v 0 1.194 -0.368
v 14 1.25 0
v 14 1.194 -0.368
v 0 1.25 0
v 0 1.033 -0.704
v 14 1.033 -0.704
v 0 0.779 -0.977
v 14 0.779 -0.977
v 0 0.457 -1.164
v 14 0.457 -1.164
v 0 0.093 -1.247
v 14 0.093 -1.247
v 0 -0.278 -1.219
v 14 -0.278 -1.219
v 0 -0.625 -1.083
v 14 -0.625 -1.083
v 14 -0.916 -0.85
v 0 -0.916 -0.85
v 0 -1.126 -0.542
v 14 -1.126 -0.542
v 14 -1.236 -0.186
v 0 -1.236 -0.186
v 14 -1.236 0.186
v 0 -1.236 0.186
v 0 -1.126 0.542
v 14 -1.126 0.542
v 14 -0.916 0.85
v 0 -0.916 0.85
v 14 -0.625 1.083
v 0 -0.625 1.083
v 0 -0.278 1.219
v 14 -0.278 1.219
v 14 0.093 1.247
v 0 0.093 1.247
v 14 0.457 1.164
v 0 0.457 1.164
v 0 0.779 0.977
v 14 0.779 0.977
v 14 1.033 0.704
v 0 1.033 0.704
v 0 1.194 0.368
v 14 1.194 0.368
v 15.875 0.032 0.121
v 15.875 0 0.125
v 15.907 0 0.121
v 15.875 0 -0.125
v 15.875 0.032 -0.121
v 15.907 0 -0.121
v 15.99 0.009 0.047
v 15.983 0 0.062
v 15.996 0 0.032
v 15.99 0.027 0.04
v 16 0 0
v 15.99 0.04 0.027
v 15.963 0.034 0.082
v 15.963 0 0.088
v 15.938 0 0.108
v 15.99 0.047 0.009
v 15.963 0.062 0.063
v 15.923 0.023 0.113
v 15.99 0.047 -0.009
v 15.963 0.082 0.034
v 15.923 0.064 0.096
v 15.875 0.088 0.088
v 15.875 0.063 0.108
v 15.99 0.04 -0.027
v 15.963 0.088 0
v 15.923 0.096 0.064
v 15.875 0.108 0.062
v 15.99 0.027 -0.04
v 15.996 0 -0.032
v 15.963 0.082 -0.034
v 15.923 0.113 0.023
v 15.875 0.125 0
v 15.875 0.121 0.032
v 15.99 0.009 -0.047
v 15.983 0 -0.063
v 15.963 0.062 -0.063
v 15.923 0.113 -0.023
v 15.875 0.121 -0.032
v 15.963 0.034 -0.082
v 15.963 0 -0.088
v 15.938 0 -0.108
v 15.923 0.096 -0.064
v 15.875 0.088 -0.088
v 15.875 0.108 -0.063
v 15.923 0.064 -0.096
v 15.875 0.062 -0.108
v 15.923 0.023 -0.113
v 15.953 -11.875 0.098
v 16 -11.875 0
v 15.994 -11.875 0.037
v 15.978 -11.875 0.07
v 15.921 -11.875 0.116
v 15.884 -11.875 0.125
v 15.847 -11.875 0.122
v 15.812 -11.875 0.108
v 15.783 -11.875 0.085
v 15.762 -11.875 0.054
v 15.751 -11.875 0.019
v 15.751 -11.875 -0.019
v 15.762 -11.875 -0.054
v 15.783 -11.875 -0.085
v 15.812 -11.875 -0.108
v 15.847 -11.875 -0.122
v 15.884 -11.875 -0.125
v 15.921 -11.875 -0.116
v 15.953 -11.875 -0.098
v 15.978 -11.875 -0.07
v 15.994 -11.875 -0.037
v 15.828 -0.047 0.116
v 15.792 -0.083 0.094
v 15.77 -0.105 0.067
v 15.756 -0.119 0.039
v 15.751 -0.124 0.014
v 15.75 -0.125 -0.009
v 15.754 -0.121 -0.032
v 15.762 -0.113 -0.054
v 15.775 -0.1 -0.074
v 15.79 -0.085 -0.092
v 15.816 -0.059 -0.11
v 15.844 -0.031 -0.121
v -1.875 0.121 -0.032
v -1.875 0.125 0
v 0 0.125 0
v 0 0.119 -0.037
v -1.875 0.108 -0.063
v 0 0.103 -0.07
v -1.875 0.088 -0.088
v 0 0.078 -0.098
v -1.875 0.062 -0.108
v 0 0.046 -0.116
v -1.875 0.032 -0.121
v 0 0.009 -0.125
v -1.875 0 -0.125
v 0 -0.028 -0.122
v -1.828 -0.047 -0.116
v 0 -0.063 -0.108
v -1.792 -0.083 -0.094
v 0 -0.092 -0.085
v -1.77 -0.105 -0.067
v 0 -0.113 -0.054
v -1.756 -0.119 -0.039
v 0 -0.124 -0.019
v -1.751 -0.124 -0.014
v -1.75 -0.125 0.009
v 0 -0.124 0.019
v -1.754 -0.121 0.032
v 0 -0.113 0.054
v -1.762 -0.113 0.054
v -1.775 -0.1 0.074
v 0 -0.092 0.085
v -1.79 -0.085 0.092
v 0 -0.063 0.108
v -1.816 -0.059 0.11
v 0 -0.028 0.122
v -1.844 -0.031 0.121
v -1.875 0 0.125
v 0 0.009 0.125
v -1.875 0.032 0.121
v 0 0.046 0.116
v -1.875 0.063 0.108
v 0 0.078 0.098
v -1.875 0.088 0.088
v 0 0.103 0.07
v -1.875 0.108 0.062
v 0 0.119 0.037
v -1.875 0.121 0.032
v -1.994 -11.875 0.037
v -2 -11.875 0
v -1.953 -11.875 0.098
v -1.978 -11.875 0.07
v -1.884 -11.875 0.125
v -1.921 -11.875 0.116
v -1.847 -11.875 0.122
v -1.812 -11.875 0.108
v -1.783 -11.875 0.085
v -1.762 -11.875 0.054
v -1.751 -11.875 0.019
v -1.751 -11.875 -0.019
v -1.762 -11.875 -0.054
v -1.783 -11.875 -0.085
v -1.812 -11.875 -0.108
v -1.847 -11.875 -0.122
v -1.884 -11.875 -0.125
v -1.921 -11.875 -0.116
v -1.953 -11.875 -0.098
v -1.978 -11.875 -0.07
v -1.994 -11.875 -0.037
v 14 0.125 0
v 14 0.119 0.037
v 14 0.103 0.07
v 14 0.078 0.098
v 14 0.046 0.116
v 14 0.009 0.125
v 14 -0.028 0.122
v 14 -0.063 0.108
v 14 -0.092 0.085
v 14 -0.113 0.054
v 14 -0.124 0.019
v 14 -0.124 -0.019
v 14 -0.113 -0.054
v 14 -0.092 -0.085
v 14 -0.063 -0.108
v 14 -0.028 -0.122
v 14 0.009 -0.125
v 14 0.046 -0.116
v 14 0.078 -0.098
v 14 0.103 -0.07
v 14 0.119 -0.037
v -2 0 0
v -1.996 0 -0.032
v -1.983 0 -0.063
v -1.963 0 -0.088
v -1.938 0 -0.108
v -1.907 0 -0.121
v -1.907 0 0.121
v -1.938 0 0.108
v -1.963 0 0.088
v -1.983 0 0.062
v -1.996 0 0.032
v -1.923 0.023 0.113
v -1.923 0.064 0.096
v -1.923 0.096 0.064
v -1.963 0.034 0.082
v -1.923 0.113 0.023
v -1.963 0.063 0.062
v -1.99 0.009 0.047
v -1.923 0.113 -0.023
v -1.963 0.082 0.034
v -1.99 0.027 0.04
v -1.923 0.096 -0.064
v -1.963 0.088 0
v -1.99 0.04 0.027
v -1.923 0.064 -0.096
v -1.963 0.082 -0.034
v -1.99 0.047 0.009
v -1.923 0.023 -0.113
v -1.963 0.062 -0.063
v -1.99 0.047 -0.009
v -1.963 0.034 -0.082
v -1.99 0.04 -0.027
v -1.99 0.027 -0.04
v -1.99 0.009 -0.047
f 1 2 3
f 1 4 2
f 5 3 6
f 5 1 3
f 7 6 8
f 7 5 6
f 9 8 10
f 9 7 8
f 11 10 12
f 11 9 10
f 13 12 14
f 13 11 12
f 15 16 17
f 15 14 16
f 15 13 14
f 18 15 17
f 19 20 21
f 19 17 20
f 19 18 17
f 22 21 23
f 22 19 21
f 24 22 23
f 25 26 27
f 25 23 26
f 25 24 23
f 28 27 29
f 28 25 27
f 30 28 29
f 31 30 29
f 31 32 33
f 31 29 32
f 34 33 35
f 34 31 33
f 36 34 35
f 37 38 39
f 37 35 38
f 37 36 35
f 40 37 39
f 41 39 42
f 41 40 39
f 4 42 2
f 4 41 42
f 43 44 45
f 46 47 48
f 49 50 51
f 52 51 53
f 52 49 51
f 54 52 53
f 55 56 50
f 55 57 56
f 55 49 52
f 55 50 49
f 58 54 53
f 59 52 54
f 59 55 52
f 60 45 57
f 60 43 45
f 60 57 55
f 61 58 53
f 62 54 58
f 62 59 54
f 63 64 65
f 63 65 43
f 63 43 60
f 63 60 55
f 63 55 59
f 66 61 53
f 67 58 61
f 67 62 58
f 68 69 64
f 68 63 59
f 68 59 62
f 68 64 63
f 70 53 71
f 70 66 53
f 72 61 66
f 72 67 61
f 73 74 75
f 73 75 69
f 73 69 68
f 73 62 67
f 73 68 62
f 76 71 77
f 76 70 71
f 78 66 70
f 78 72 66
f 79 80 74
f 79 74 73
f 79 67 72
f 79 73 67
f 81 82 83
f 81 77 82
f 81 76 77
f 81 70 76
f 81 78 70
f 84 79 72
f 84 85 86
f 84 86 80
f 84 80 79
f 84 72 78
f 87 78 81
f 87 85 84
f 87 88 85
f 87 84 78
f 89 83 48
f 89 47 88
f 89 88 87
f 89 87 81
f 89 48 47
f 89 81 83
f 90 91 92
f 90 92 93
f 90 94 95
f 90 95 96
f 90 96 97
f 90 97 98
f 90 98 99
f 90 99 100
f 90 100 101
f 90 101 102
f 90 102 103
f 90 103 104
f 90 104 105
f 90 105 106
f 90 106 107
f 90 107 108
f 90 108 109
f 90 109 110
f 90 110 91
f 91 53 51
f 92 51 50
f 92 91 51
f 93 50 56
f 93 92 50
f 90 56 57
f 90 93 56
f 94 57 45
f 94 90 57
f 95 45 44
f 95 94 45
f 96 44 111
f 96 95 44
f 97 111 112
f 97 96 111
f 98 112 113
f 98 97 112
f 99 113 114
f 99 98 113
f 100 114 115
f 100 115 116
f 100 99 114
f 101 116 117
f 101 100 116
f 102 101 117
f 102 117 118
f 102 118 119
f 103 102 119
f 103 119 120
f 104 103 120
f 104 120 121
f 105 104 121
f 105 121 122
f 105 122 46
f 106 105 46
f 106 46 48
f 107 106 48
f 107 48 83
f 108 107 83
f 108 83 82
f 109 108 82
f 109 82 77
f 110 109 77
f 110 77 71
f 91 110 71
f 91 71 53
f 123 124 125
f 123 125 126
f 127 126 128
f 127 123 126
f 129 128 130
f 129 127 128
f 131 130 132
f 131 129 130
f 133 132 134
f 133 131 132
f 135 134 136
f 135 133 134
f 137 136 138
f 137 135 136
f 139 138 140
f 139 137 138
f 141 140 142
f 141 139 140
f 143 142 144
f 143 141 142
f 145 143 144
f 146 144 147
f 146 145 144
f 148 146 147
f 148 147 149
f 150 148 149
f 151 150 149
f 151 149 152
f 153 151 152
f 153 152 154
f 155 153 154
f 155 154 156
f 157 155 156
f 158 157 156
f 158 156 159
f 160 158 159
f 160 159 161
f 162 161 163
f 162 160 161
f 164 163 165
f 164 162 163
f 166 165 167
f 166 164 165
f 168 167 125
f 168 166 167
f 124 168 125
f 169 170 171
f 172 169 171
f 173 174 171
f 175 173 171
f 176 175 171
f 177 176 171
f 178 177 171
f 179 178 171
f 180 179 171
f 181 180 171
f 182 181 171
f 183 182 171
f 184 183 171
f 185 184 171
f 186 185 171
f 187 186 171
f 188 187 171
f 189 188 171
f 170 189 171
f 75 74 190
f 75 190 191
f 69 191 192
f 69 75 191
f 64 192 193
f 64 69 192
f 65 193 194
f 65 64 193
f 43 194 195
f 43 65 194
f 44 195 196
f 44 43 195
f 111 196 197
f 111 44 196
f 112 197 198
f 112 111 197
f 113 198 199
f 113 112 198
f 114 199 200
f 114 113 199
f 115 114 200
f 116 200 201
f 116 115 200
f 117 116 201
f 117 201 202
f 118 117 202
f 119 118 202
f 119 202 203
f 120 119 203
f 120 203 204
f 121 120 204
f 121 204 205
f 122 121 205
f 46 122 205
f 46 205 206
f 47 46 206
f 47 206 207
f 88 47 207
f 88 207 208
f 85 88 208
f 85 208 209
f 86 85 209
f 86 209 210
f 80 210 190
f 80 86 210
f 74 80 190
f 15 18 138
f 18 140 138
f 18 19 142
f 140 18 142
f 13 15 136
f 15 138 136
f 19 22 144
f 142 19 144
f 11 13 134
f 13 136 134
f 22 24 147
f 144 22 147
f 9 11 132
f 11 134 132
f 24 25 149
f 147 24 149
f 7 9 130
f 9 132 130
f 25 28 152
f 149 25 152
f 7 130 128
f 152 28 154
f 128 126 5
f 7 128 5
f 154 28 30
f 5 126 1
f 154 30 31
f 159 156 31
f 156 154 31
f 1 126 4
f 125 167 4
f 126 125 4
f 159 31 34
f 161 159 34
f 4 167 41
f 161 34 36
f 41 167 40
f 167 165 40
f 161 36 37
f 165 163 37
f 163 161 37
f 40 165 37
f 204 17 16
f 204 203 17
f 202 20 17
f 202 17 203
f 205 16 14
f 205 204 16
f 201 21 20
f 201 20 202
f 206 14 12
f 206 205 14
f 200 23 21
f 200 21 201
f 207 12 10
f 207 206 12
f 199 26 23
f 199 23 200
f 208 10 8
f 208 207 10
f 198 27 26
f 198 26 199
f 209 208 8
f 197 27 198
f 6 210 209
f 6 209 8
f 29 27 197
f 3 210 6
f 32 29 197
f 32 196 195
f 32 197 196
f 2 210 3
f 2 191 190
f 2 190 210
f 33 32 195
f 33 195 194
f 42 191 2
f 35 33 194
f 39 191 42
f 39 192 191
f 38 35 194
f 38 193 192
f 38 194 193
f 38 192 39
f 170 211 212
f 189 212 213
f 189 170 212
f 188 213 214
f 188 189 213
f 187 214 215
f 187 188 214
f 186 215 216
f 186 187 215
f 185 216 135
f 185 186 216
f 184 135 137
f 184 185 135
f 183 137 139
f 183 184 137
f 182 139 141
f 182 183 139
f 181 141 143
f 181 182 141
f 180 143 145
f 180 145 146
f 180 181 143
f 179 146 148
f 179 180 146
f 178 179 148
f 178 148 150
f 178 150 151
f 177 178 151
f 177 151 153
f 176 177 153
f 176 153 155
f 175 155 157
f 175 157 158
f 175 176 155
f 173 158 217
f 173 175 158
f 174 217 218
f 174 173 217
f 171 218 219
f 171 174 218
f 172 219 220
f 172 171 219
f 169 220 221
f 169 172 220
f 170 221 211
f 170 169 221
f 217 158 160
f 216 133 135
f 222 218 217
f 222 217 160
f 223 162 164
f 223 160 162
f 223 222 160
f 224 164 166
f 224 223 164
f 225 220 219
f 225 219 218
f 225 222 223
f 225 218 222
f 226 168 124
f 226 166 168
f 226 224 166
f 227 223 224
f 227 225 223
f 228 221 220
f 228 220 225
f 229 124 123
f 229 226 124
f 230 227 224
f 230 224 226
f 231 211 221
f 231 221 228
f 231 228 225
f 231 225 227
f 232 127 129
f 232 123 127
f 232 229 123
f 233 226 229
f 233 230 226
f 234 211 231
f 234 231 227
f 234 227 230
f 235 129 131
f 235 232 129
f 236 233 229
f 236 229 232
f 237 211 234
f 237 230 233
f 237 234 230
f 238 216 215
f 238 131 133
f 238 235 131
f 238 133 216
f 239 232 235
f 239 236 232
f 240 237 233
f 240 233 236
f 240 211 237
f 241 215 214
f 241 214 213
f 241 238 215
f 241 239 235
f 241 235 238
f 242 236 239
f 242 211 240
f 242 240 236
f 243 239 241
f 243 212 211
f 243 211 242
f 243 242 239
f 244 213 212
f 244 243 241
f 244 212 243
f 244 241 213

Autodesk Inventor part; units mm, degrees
ref_plane "YZ Plane" through (0, 0, 0) normal (1, 0, 0) x (0, 1, 0)
ref_plane "XZ Plane" through (0, 0, 0) normal (0, 1, 0) x (-1, 0, 0)
ref_plane "XY Plane" through (0, 0, 0) normal (0, 0, 1) x (1, 0, 0)
sketch "Sketch2" plane through (0, 0, 0) normal (1, 0, 0) x (0, 1, 0)
  circle A0 centre (0, 0) radius 1.25
  dimension "d8" = 2.5
extrude "Extrusion1" add sketch "Sketch2" along normal blind 14
sketch "Sketch6" plane through (0, 0, 0) normal (0, 0, 1) x (1, 0, 0)
  line L0 (14, -1.25) -> (14, 1.25) projected
  line L1 (14, 0) -> (14, 0.125)
  line L2 (14, 0.125) -> (15.875, 0.125)
  line L3 (16, 0) -> (16, -11.875)
  line L4 (14, 0) -> (15.875, 0)
  line L5 (15.875, 0) -> (15.875, -11.875)
  line L6 (15.875, -11.875) -> (16, -11.875)
  line L7 (15.875, 0) -> (16, 0)
  line L8 (17.9417, 0) -> (15.75, 0)
  arc A0 (15.875, -0.125) -> (15.75, 0) centre (15.75, -0.125) ccw
  line L9 (15.75, 0) -> (16, 0)
  line L10 (0, 0) -> (0, 0.125)
  line L11 (0, 0.125) -> (-1.875, 0.125)
  line L12 (-2, 0) -> (-2, -11.875)
  line L13 (-2, -11.875) -> (-1.875, -11.875)
  line L14 (-1.875, -11.875) -> (-1.875, -0.125)
  line L15 (-1.75, 0) -> (0, 0)
  arc A1 (-1.875, 0.125) -> (-2, 0) centre (-1.875, 0) ccw
  arc A2 (-1.75, 0) -> (-1.875, -0.125) centre (-1.75, -0.125) ccw
  line L16 (-1.75, 0) -> (-2, 0)
  line L17 (-1.875, -0.125) -> (-1.875, 0)
  arc A3 (16, 0) -> (15.875, 0.125) centre (15.875, 0) ccw
  point P0 (16, 0.125)
  point P1 (18.875, 0.125)
  point P2 (-2, 0.125)
  point P3 (-1.875, 0)
  dimension "d16" = 0.125
  dimension "d17" = 2
  dimension "d18" = 12
  dimension "d19" = 1.875
  dimension "d26" = 0.125
  dimension "d27" = 2
  dimension "d28" = 0.125
  dimension "d29" = 0.125
  dimension "d30" = 0.125
  dimension "d33" = 0.125
  dimension "d35" = 12
revolve "Revolution2" add sketch "Sketch6" angle 360 about axis through (14, 0, 0) along (1, 0, 0) contours L0 L2 A3 L7 L4
revolve "Revolution3" add sketch "Sketch6" angle 360 about axis through (15.875, 0, 0) along (0, -1, 0) contours L7 L3 L6 L5
revolve "Revolution4" add sketch "Sketch6" angle 360 about axis through (-1.75, 0, 0) along (1, 0, 0) contours L15 L16 A1 L11 L10
revolve "Revolution5" add sketch "Sketch6" angle 360 about axis through (-1.875, -11.875, 0) along (0, 1, 0) contours L14 L13 L12 L16 L17
equation "\"d27\" = d17"
equation "\"d35\" = d18"
properties part number "Reed Switch Puerta Derecha" material "Aluminum 6061"
